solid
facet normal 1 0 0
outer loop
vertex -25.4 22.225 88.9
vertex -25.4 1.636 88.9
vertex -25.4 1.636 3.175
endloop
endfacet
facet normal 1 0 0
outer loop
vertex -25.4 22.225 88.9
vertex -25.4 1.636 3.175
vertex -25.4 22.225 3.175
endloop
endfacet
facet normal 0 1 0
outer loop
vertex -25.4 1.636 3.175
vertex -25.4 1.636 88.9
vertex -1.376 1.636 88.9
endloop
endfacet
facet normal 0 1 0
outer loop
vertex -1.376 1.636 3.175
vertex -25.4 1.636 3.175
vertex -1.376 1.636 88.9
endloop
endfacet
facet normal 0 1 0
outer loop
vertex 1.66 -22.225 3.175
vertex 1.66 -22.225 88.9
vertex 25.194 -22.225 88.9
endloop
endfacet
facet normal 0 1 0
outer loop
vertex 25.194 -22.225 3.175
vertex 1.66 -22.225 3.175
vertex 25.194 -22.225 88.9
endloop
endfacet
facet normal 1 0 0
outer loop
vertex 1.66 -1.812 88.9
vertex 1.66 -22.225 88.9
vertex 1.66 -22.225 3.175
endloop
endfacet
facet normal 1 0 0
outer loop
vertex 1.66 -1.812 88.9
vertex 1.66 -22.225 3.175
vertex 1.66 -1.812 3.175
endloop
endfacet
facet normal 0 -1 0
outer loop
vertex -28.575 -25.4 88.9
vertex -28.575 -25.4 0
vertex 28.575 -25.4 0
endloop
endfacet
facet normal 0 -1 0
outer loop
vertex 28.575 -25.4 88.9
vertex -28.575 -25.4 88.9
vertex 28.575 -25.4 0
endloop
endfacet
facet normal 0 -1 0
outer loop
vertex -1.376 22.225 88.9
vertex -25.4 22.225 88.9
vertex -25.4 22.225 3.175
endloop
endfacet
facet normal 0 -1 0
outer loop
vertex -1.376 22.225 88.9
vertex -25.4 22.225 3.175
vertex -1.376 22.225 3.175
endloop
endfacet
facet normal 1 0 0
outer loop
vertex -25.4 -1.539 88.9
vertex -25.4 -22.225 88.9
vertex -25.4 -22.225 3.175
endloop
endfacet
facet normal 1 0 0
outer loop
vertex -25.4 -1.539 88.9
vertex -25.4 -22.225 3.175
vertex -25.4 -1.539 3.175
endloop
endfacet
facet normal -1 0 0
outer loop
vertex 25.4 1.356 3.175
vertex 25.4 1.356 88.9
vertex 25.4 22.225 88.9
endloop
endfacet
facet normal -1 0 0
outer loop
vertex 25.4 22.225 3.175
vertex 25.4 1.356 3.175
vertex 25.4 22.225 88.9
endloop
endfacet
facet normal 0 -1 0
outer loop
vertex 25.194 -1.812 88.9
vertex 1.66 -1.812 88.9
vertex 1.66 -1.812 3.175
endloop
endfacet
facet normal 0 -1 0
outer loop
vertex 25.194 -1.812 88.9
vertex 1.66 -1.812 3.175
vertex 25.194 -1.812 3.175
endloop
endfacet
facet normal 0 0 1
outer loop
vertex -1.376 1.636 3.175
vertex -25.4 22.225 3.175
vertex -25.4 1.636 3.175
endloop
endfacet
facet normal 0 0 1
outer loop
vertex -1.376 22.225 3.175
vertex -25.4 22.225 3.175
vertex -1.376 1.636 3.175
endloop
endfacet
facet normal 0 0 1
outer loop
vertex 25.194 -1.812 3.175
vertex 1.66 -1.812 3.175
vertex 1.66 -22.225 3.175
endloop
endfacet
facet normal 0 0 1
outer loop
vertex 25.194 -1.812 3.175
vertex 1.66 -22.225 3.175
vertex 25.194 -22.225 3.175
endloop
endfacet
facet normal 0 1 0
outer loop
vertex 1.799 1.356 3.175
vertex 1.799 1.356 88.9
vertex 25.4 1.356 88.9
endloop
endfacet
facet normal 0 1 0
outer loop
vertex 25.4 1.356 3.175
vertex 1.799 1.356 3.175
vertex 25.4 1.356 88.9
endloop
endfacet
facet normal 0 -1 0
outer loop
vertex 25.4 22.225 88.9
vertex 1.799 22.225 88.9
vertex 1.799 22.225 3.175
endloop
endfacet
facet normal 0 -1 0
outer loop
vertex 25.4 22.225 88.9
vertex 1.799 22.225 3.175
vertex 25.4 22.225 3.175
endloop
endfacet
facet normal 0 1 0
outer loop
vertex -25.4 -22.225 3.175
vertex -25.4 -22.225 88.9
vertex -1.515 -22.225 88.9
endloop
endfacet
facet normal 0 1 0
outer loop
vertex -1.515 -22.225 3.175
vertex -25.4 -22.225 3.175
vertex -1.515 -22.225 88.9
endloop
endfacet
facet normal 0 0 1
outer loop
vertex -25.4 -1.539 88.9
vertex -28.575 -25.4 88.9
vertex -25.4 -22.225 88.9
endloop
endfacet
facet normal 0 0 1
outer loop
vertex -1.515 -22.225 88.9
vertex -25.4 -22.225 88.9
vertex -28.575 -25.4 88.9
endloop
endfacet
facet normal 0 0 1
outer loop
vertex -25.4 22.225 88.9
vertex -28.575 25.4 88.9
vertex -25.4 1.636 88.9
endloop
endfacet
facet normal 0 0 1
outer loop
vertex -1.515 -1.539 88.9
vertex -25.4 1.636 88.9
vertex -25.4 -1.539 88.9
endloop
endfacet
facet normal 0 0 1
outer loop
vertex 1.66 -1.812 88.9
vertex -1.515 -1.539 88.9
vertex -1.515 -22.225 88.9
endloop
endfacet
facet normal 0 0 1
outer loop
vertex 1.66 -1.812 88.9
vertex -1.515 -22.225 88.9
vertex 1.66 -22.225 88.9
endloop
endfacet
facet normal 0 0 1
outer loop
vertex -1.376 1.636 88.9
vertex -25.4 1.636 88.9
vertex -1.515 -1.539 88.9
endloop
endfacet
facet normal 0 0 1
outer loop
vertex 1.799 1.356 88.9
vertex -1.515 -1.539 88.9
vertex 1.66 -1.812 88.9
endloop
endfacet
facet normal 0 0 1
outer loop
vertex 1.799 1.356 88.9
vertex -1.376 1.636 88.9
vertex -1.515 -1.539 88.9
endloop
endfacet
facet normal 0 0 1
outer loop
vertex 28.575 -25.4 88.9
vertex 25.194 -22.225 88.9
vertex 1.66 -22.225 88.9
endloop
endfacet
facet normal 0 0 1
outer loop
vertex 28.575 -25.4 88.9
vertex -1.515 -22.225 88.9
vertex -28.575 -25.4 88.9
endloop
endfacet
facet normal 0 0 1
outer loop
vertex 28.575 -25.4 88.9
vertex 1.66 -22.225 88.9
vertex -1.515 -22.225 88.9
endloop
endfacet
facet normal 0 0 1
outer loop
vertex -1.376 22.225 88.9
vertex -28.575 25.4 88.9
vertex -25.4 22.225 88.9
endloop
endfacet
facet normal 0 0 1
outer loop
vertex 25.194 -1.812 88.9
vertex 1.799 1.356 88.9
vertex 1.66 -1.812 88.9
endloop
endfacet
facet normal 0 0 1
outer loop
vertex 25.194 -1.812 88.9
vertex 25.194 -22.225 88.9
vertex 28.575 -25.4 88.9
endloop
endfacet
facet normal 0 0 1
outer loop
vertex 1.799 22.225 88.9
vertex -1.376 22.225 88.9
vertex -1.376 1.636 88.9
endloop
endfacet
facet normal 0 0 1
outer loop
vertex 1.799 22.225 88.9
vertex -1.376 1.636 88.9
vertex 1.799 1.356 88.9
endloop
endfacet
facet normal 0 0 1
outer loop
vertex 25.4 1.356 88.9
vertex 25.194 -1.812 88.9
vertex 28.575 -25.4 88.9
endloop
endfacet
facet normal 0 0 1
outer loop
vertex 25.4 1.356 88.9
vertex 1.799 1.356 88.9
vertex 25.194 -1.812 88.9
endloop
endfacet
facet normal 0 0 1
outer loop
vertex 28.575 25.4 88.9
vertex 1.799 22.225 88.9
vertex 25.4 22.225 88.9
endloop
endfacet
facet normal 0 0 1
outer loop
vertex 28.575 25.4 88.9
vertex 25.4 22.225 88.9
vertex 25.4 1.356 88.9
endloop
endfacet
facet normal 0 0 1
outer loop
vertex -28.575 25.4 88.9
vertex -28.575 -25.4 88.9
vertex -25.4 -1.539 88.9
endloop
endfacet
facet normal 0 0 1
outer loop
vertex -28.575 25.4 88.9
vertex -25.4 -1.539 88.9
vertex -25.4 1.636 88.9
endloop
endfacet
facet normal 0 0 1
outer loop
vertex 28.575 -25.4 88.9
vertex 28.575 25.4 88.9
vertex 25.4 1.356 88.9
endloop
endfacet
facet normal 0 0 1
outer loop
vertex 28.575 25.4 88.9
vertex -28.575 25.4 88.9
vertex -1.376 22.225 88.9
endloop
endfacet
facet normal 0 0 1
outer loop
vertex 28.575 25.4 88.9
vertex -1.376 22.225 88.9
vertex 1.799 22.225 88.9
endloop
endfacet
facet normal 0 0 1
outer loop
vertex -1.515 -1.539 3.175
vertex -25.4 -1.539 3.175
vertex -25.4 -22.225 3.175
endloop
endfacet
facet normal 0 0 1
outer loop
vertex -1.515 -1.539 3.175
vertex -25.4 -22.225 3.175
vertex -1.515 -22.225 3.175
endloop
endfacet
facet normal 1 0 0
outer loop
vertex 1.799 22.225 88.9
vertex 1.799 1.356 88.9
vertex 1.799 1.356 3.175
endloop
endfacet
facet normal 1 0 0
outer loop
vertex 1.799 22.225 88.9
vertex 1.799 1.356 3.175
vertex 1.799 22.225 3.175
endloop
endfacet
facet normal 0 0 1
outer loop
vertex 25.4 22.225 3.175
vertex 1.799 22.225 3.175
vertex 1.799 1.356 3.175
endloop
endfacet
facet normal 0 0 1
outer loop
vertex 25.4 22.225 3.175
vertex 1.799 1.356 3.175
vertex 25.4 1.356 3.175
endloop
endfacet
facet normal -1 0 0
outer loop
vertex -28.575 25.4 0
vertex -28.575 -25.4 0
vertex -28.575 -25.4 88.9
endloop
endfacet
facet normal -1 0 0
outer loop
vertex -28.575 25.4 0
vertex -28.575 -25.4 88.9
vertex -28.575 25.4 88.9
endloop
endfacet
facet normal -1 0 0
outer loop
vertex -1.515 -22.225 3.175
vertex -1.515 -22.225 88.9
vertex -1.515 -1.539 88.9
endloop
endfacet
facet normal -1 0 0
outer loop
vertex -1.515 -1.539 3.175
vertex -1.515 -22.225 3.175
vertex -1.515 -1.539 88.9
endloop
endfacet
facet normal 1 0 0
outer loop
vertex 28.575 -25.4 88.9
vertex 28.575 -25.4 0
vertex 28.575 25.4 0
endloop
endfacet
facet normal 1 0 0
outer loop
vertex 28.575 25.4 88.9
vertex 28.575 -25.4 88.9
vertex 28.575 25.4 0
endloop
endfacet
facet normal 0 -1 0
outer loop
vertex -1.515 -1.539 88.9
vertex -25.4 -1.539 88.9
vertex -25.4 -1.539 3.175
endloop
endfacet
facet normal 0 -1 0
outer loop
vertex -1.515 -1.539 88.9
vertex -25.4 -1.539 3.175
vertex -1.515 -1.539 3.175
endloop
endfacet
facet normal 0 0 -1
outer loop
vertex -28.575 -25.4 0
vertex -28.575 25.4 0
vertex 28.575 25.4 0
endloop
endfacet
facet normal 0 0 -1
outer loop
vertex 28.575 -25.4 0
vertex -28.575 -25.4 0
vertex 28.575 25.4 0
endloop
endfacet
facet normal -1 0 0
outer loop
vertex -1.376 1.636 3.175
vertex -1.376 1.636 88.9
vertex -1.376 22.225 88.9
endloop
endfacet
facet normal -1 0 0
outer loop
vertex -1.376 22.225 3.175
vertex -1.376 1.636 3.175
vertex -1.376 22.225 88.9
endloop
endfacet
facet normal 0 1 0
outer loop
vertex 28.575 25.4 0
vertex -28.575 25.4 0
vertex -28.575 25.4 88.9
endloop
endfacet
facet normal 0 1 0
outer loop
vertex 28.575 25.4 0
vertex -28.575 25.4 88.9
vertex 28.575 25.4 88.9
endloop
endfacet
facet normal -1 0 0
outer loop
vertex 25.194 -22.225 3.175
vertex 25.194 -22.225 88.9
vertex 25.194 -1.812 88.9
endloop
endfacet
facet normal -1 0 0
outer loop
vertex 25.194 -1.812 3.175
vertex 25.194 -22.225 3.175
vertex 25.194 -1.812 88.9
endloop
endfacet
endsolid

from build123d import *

# Parameters (mm, degrees)
F0_W     = 57.15
F0_H     = 50.8
F1_DEPTH = 88.9
F2_W     = 24.023754
F2_H     = 20.589164
F3_DEPTH = 85.725
F2_W_2   = 23.884728
F2_H_2   = 20.685836
F4_DEPTH = 85.725
F2_W_3   = 23.601246
F2_H_3   = 20.868859
F5_DEPTH = 85.725
F2_W_4   = 23.534088
F2_H_4   = 20.412843
F6_DEPTH = 85.725


with BuildPart() as f1:
    # F0 (on Top) → F1 (new body)
    with BuildSketch(Plane.XY):
        Rectangle(F0_W, F0_H)
    extrude(amount=F1_DEPTH)

    # F2 (on face) → F3 (cut)
    with BuildSketch(Plane.XY.offset(88.9)):
        with Locations((-13.388123, 11.930418)):
            Rectangle(F2_W, F2_H)
    extrude(amount=-F3_DEPTH, mode=Mode.SUBTRACT)

    # F2 (on face) → F4 (cut)
    with BuildSketch(Plane.XY.offset(88.9)):
        with Locations((-13.457636, -11.882082)):
            Rectangle(F2_W_2, F2_H_2)
    extrude(amount=-F4_DEPTH, mode=Mode.SUBTRACT)

    # F2 (on face) → F5 (cut)
    with BuildSketch(Plane.XY.offset(88.9)):
        with Locations((13.599377, 11.79057)):
            Rectangle(F2_W_3, F2_H_3)
    extrude(amount=-F5_DEPTH, mode=Mode.SUBTRACT)

    # F2 (on face) → F6 (cut)
    with BuildSketch(Plane.XY.offset(88.9)):
        with Locations((13.426772, -12.018578)):
            Rectangle(F2_W_4, F2_H_4)
    extrude(amount=-F6_DEPTH, mode=Mode.SUBTRACT)


solid = f1.part
